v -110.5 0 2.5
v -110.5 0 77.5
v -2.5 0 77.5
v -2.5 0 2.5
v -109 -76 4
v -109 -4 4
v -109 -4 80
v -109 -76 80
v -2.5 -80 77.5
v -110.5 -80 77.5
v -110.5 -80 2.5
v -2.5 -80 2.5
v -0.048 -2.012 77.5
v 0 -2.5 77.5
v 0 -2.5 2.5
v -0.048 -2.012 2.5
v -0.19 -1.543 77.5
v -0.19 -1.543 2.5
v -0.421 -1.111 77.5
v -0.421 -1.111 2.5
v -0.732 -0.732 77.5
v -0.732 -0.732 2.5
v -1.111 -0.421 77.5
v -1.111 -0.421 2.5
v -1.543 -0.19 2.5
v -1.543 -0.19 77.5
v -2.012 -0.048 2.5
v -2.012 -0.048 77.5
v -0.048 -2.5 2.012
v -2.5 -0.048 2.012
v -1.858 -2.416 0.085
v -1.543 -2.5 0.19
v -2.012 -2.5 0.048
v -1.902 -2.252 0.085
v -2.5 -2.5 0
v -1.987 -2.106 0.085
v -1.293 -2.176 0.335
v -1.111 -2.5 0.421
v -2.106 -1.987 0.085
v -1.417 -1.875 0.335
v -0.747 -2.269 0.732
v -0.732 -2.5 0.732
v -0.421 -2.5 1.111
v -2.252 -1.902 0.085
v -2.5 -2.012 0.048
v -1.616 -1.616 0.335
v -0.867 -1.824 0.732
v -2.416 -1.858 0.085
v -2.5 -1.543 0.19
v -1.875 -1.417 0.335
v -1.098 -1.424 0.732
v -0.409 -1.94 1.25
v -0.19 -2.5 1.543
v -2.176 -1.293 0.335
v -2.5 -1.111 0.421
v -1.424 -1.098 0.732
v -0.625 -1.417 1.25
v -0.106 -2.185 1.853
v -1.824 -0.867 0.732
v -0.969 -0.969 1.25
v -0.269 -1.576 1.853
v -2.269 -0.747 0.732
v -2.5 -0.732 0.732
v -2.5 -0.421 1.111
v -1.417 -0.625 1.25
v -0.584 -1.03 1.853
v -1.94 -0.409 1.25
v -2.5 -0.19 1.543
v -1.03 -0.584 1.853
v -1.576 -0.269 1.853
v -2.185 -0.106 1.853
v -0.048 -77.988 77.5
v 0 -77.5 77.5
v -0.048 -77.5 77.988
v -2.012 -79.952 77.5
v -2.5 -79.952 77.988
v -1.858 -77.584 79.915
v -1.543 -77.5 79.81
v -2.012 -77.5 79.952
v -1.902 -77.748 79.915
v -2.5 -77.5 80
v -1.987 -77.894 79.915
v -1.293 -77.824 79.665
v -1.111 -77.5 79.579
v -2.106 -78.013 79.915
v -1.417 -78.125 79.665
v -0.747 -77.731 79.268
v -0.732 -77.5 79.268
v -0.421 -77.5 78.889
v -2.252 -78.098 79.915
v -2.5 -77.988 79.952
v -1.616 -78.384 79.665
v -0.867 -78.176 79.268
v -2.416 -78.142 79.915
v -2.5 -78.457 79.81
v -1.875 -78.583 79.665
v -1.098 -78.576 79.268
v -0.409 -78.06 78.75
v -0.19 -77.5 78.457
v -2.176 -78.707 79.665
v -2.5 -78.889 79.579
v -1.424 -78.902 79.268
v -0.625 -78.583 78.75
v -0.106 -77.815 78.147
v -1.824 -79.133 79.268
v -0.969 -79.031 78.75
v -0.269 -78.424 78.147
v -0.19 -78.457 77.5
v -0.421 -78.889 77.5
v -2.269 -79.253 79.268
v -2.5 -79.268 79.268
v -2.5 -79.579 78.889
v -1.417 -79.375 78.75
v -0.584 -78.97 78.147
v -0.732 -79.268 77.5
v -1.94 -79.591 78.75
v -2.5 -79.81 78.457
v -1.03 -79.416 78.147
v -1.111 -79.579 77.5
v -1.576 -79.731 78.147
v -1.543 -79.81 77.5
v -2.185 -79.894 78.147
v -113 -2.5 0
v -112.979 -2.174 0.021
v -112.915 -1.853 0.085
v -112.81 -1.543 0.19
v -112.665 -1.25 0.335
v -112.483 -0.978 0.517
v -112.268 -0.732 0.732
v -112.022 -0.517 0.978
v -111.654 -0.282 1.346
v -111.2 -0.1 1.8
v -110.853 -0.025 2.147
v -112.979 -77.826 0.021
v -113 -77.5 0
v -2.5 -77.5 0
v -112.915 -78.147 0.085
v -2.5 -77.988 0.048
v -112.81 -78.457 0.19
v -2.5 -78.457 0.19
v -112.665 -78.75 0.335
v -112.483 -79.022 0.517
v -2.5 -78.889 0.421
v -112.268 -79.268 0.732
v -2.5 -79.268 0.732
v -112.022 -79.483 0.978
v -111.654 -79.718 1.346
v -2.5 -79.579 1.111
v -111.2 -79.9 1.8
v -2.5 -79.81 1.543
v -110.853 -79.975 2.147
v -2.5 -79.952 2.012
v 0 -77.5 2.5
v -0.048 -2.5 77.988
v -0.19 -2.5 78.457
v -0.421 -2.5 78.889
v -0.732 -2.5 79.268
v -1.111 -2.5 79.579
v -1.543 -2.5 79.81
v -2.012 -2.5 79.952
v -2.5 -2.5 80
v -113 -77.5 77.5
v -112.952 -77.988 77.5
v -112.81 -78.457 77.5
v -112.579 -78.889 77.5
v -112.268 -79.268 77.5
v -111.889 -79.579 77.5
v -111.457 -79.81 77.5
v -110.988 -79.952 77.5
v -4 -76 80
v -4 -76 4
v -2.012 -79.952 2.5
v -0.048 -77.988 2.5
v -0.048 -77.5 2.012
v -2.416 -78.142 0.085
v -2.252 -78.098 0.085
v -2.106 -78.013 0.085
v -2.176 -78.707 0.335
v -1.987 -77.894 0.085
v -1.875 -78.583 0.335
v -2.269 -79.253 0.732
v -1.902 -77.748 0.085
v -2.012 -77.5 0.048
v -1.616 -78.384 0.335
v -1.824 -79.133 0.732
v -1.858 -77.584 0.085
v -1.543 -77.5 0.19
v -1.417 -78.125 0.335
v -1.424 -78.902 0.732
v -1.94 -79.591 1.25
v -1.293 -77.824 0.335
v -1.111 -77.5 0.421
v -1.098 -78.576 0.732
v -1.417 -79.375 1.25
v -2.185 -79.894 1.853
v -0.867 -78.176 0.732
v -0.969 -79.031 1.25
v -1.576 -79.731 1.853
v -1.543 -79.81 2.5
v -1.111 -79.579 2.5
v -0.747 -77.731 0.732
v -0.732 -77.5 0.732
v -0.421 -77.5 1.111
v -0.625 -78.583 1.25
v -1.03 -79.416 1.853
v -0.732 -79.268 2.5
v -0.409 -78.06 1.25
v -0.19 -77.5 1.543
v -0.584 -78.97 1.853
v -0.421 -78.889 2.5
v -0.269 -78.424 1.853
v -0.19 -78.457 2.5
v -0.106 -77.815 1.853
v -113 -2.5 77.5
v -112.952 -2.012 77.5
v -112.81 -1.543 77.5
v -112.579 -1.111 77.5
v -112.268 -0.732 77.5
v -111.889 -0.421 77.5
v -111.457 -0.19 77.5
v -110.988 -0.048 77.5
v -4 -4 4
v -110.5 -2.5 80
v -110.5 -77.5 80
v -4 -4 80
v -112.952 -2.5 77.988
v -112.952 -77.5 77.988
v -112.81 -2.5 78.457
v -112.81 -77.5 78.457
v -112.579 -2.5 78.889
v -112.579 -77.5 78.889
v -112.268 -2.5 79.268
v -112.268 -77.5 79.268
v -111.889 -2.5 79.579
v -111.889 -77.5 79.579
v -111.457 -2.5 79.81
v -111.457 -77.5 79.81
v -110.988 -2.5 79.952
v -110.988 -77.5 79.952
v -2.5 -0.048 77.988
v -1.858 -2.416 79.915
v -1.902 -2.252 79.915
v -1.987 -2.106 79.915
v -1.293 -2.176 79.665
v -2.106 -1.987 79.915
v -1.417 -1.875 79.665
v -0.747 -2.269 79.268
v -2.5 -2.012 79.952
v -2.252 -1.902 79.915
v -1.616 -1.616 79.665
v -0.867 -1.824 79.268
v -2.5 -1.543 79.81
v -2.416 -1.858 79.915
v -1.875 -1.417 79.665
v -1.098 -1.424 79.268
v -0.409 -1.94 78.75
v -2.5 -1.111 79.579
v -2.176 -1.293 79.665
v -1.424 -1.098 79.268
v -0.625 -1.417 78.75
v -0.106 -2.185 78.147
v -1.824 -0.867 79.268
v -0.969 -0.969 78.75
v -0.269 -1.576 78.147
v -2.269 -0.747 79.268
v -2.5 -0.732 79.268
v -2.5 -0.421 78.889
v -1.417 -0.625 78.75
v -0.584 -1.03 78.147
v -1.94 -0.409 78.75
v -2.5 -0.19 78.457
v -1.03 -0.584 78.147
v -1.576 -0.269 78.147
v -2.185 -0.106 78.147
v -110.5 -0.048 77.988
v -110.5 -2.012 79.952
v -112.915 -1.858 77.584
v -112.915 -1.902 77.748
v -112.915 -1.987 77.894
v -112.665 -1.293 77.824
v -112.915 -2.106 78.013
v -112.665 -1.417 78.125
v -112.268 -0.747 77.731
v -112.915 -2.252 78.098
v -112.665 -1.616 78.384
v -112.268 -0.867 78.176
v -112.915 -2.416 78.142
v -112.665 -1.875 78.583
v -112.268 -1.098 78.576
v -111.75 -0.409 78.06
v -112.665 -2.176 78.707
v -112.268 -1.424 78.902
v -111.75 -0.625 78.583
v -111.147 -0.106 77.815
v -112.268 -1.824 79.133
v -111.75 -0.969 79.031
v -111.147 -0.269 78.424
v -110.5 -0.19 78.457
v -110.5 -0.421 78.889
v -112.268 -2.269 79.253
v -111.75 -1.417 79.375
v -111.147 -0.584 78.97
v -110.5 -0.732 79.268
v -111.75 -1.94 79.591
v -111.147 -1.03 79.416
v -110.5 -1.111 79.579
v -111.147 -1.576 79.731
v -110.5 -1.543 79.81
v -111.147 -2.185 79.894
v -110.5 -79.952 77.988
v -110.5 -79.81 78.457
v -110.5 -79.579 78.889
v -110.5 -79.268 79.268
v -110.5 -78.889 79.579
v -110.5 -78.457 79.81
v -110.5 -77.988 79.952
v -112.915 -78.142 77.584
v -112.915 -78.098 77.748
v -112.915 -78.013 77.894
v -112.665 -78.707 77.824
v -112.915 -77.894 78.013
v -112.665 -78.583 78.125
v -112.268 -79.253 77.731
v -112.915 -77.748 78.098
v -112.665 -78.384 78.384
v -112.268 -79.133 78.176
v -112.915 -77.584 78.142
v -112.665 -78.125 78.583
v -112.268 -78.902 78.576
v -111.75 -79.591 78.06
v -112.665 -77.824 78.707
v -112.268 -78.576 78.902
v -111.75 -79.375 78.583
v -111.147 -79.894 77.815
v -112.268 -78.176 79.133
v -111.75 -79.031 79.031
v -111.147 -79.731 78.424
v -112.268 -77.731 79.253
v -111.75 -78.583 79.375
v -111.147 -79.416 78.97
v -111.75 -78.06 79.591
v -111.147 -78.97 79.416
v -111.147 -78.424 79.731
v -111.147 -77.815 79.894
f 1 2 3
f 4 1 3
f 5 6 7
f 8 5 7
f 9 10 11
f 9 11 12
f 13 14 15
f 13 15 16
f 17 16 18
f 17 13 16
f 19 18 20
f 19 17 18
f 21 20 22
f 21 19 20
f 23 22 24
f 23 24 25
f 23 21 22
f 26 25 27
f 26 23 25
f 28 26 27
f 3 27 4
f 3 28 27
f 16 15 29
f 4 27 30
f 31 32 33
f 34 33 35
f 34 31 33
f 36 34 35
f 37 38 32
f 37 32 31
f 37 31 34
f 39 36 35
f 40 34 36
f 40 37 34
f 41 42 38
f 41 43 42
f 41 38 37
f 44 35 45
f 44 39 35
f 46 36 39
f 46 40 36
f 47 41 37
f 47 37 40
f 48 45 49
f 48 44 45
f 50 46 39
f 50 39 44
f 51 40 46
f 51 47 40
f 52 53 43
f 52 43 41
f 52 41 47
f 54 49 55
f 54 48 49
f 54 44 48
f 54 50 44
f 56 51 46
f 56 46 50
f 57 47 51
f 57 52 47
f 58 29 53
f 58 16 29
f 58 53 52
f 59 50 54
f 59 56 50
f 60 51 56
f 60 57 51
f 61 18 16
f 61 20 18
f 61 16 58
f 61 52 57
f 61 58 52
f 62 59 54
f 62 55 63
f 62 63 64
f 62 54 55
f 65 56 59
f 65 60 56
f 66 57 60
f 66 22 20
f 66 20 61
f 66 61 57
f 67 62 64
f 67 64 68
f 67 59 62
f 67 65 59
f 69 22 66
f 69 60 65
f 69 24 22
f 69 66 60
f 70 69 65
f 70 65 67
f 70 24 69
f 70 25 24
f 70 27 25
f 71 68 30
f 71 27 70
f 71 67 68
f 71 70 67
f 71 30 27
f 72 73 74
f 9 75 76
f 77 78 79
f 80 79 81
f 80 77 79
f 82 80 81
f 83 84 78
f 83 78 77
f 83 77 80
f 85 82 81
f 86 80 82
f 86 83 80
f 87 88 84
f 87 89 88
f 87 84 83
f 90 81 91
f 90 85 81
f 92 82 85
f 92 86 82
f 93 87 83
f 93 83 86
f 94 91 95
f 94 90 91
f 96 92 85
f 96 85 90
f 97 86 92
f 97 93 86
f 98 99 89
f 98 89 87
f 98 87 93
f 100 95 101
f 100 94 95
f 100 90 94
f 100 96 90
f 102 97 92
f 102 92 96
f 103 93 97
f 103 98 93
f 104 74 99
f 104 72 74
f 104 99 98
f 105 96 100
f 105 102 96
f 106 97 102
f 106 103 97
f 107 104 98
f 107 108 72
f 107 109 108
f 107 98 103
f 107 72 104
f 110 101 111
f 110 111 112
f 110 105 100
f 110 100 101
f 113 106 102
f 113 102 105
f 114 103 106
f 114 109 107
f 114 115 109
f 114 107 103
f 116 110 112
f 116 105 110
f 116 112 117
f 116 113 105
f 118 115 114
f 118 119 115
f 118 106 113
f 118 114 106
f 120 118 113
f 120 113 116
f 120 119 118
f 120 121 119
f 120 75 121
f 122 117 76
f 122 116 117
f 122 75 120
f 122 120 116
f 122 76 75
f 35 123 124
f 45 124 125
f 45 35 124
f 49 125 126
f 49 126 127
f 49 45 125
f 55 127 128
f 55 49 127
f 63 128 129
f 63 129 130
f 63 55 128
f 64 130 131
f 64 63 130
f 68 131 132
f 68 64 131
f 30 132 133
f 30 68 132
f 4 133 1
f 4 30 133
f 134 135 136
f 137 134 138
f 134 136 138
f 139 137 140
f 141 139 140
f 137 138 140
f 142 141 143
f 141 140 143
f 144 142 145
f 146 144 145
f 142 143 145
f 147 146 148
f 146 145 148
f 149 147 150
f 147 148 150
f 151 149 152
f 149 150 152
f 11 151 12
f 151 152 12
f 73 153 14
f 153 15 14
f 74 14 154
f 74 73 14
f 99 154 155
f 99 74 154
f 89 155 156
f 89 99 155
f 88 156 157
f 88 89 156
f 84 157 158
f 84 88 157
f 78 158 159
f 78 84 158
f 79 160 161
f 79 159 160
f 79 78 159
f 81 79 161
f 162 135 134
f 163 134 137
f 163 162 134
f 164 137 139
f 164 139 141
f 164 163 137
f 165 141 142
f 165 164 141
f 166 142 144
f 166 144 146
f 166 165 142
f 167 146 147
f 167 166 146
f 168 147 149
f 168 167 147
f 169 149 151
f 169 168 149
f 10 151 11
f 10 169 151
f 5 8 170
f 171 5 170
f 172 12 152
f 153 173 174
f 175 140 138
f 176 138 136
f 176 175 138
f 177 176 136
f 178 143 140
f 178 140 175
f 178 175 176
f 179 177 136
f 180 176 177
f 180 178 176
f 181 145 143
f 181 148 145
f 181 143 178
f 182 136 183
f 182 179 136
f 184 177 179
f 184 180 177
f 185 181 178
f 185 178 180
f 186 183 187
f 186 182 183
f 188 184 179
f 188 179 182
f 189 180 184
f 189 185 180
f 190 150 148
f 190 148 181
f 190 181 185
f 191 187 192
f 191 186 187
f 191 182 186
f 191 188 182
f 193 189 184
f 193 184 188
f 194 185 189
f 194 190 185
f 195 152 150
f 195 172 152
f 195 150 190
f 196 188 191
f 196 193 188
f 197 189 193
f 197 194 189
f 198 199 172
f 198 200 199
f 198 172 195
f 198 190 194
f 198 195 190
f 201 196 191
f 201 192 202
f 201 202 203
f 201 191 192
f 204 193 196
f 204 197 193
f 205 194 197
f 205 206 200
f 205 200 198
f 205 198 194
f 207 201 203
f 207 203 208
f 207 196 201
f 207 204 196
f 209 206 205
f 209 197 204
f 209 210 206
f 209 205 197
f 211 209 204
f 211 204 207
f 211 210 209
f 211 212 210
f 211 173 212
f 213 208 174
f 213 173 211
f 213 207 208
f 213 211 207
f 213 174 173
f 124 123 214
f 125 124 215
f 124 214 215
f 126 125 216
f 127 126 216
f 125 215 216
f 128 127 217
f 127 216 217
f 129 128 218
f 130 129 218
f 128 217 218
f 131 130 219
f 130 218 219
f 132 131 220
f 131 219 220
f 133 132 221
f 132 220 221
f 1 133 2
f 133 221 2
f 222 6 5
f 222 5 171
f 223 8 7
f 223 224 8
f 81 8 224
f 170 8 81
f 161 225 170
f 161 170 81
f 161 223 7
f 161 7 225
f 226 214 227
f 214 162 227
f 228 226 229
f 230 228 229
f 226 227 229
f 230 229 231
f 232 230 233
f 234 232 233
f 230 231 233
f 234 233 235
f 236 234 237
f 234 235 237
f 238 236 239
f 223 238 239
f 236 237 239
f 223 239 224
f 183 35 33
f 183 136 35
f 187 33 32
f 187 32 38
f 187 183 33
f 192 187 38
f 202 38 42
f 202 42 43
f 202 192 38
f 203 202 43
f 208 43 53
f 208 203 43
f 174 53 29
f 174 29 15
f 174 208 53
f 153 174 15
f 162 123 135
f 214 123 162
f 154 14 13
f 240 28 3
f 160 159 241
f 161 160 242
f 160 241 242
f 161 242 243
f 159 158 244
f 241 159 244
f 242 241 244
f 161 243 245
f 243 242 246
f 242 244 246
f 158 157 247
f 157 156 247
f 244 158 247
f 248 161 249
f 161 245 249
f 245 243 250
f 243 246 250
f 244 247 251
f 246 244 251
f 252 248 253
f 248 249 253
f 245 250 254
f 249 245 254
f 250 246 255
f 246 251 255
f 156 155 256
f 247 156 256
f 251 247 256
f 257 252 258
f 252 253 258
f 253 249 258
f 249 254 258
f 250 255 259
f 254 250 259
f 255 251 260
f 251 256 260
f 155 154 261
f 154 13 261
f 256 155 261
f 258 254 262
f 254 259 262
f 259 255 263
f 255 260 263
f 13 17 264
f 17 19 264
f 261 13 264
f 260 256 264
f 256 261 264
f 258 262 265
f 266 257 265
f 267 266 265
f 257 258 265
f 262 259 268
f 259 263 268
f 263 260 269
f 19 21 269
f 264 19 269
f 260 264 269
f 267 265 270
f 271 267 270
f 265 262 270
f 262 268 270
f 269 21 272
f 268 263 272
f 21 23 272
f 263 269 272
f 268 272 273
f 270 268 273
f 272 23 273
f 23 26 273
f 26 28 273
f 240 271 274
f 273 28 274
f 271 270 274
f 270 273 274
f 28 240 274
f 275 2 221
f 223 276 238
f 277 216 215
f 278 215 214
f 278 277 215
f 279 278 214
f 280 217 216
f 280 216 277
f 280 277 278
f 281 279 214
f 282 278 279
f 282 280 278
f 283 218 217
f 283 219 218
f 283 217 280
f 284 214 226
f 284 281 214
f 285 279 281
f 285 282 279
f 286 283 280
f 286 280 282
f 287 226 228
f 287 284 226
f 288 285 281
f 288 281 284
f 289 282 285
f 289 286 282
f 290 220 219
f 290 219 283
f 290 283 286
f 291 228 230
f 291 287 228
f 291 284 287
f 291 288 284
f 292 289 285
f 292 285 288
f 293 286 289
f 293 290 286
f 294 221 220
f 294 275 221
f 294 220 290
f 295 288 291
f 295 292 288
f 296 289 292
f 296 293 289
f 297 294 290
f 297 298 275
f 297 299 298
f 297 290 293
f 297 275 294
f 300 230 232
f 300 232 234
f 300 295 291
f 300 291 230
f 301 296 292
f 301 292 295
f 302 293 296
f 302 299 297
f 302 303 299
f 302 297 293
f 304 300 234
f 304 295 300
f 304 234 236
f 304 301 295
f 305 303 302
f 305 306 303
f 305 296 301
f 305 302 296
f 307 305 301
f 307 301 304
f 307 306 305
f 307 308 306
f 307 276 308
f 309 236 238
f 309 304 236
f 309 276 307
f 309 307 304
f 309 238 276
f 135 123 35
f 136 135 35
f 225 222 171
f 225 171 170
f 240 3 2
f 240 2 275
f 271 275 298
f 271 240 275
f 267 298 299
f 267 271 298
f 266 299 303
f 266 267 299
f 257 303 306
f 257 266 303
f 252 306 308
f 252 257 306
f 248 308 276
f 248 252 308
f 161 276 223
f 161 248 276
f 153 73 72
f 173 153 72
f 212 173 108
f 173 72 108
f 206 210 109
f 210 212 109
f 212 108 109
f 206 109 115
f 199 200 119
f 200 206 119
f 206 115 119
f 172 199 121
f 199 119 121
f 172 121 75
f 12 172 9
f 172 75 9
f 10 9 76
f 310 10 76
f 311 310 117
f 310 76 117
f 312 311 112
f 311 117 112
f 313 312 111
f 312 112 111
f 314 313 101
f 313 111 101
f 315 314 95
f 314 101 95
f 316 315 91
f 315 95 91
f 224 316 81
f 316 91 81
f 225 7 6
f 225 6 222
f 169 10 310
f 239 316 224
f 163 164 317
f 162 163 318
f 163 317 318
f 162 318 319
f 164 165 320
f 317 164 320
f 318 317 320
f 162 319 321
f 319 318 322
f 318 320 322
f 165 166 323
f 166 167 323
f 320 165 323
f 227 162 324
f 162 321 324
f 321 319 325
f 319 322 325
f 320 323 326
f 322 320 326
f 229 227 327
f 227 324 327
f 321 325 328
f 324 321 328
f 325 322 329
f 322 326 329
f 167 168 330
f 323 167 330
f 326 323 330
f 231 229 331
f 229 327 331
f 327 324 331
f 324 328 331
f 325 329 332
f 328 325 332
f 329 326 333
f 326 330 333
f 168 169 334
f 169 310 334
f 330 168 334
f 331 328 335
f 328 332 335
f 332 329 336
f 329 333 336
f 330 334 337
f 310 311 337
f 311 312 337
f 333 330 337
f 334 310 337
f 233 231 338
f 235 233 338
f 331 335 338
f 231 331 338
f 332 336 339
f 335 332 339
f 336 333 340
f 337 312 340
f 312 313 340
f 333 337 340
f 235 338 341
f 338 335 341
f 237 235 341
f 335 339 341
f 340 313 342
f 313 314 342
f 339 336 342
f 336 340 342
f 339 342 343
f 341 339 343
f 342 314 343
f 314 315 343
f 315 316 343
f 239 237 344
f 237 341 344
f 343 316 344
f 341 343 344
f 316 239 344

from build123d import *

# Parameters (mm, degrees)
F0_W     = 113
F0_H     = 80
F1_DEPTH = 80
F2_T     = -4
F3_R     = 2.5


with BuildPart() as f1:
    # F0 (on Front) → F1 (new body)
    with BuildSketch(Plane.XZ):
        with Locations((-56.5, 40)):
            Rectangle(F0_W, F0_H)
    extrude(amount=F1_DEPTH)

    # F2
    f2_openings = [f1.faces().sort_by_distance(p)[0] for p in [
        (-56.5, -40, 80),
    ]]
    offset(amount=F2_T, openings=f2_openings)

    # F3
    f3_edges = [f1.edges().sort_by_distance(p)[0] for p in [
        (0, -80, 40),
        (0, 0, 40),
        (0, -40, 80),
        (-56.5, -80, 80),
        (-56.5, 0, 80),
        (-56.5, -80, 0),
        (0, -40, 0),
        (-56.5, 0, 0),
        (-113, -80, 40),
        (-113, 0, 40),
        (-113, -40, 80),
    ]]
    fillet(f3_edges, radius=F3_R)


solid = f1.part
